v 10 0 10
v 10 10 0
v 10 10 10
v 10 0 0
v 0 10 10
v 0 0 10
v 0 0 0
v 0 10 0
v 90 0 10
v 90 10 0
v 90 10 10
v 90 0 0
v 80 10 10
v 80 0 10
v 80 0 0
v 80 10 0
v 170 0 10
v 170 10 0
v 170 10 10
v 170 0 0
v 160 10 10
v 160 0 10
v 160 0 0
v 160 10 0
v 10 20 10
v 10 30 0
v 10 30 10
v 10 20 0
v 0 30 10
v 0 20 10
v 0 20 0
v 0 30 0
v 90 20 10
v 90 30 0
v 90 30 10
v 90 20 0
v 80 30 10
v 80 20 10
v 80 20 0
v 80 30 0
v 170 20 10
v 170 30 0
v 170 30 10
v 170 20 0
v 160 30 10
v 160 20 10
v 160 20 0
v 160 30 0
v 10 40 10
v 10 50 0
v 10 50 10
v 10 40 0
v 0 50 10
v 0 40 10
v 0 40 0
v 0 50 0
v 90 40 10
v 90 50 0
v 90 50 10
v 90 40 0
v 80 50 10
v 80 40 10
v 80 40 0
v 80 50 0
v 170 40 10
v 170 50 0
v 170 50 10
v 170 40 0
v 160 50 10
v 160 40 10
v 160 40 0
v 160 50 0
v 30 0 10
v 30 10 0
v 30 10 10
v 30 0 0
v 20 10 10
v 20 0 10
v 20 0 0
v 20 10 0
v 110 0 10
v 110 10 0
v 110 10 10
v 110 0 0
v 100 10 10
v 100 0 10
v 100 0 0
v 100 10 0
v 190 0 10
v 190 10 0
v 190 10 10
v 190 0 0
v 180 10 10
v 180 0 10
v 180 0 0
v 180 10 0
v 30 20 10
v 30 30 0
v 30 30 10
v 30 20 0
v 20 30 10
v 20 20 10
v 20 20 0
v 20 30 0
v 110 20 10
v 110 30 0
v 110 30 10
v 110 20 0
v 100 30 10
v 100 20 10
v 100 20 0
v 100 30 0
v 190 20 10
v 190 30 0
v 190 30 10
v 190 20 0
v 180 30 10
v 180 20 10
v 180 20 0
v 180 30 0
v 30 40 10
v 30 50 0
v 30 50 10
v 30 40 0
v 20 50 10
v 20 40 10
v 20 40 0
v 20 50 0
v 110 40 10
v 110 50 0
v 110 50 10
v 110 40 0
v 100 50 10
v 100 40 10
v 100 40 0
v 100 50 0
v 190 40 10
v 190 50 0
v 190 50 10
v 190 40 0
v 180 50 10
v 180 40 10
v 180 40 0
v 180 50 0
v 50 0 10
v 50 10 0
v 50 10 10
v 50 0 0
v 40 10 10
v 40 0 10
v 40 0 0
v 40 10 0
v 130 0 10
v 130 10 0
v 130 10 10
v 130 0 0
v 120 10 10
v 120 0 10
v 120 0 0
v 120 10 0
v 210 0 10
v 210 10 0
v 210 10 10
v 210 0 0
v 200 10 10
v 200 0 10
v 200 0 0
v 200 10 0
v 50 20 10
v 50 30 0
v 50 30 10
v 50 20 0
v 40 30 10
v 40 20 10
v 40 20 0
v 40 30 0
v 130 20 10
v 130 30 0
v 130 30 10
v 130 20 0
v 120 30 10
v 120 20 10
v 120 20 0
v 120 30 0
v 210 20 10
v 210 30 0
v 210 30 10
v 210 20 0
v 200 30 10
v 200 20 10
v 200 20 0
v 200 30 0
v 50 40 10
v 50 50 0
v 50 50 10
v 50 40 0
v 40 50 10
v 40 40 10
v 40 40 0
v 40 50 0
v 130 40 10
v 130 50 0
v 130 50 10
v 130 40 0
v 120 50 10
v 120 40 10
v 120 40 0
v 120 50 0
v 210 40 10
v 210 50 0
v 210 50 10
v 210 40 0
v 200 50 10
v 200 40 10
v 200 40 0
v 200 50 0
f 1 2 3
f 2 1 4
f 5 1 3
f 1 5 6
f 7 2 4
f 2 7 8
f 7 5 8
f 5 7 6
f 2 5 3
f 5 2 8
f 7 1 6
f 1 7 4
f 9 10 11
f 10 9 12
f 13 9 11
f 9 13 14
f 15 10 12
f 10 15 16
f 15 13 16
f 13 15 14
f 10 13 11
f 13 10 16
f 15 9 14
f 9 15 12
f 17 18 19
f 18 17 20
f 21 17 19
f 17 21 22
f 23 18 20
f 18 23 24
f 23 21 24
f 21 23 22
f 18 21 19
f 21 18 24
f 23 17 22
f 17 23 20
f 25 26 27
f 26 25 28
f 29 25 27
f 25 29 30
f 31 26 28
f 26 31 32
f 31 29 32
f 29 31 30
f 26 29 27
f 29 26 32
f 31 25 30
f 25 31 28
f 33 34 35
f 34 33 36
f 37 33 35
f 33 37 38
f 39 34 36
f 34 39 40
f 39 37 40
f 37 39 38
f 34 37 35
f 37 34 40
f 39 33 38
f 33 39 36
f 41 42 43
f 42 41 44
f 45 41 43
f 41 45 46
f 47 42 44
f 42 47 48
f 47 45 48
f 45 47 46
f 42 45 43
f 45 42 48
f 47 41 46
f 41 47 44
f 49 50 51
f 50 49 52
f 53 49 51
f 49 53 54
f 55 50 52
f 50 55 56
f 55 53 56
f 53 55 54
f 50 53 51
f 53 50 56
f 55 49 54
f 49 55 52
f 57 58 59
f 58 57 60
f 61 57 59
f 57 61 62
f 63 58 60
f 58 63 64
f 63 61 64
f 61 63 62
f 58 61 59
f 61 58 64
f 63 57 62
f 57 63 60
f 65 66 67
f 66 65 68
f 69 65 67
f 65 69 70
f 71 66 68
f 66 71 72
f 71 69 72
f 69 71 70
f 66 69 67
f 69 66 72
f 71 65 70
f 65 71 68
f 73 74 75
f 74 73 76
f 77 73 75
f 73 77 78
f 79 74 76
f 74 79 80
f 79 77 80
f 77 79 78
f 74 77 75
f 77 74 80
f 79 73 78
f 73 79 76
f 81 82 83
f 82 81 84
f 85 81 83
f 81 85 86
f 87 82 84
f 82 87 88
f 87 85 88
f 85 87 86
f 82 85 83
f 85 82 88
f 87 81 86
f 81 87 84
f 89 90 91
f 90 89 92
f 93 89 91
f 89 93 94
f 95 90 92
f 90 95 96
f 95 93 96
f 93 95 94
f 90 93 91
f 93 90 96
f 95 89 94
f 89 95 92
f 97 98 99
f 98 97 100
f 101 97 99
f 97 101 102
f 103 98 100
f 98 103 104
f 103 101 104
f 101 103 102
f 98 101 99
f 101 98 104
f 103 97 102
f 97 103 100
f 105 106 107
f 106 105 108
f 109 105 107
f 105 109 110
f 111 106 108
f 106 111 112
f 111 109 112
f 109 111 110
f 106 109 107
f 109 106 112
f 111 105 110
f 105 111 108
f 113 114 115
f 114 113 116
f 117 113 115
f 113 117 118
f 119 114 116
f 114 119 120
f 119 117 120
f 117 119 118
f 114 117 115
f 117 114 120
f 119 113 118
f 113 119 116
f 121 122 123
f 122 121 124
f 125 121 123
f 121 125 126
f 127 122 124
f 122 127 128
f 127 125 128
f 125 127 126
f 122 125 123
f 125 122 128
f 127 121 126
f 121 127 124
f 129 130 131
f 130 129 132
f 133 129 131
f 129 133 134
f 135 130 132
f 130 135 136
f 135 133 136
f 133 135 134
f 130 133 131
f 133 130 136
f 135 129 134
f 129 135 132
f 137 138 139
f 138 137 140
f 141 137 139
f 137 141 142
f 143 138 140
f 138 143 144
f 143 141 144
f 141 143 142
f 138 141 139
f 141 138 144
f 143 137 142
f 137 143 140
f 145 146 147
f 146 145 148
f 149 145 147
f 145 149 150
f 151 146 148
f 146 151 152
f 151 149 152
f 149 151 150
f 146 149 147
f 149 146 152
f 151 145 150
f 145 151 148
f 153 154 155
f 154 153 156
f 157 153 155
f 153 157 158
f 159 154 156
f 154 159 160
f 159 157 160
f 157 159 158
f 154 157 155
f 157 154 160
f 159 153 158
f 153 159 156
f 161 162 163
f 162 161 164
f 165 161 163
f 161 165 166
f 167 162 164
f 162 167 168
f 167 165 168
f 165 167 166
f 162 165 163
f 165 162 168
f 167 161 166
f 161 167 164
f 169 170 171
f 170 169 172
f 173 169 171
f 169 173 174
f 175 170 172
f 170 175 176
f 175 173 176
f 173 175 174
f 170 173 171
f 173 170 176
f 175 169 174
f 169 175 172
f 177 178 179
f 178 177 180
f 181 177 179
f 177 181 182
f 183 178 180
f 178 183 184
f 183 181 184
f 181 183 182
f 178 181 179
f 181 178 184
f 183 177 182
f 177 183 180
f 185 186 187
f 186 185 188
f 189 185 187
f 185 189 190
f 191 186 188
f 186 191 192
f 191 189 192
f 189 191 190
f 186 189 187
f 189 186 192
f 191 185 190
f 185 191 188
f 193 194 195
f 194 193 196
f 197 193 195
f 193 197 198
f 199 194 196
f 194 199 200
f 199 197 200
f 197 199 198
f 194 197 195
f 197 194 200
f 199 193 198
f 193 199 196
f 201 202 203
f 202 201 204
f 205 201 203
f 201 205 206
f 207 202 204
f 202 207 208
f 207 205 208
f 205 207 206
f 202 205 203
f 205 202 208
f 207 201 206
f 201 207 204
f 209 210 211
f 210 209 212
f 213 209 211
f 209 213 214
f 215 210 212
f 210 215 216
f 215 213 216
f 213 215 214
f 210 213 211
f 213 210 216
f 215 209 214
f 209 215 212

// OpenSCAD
for (x = [0:0.5:1], y = [0:0.5:1], z = [0:0.5:1])
	translate(40 * [x + 4 * z, y, 0])
		color([x, y, z])
			cube(10);
